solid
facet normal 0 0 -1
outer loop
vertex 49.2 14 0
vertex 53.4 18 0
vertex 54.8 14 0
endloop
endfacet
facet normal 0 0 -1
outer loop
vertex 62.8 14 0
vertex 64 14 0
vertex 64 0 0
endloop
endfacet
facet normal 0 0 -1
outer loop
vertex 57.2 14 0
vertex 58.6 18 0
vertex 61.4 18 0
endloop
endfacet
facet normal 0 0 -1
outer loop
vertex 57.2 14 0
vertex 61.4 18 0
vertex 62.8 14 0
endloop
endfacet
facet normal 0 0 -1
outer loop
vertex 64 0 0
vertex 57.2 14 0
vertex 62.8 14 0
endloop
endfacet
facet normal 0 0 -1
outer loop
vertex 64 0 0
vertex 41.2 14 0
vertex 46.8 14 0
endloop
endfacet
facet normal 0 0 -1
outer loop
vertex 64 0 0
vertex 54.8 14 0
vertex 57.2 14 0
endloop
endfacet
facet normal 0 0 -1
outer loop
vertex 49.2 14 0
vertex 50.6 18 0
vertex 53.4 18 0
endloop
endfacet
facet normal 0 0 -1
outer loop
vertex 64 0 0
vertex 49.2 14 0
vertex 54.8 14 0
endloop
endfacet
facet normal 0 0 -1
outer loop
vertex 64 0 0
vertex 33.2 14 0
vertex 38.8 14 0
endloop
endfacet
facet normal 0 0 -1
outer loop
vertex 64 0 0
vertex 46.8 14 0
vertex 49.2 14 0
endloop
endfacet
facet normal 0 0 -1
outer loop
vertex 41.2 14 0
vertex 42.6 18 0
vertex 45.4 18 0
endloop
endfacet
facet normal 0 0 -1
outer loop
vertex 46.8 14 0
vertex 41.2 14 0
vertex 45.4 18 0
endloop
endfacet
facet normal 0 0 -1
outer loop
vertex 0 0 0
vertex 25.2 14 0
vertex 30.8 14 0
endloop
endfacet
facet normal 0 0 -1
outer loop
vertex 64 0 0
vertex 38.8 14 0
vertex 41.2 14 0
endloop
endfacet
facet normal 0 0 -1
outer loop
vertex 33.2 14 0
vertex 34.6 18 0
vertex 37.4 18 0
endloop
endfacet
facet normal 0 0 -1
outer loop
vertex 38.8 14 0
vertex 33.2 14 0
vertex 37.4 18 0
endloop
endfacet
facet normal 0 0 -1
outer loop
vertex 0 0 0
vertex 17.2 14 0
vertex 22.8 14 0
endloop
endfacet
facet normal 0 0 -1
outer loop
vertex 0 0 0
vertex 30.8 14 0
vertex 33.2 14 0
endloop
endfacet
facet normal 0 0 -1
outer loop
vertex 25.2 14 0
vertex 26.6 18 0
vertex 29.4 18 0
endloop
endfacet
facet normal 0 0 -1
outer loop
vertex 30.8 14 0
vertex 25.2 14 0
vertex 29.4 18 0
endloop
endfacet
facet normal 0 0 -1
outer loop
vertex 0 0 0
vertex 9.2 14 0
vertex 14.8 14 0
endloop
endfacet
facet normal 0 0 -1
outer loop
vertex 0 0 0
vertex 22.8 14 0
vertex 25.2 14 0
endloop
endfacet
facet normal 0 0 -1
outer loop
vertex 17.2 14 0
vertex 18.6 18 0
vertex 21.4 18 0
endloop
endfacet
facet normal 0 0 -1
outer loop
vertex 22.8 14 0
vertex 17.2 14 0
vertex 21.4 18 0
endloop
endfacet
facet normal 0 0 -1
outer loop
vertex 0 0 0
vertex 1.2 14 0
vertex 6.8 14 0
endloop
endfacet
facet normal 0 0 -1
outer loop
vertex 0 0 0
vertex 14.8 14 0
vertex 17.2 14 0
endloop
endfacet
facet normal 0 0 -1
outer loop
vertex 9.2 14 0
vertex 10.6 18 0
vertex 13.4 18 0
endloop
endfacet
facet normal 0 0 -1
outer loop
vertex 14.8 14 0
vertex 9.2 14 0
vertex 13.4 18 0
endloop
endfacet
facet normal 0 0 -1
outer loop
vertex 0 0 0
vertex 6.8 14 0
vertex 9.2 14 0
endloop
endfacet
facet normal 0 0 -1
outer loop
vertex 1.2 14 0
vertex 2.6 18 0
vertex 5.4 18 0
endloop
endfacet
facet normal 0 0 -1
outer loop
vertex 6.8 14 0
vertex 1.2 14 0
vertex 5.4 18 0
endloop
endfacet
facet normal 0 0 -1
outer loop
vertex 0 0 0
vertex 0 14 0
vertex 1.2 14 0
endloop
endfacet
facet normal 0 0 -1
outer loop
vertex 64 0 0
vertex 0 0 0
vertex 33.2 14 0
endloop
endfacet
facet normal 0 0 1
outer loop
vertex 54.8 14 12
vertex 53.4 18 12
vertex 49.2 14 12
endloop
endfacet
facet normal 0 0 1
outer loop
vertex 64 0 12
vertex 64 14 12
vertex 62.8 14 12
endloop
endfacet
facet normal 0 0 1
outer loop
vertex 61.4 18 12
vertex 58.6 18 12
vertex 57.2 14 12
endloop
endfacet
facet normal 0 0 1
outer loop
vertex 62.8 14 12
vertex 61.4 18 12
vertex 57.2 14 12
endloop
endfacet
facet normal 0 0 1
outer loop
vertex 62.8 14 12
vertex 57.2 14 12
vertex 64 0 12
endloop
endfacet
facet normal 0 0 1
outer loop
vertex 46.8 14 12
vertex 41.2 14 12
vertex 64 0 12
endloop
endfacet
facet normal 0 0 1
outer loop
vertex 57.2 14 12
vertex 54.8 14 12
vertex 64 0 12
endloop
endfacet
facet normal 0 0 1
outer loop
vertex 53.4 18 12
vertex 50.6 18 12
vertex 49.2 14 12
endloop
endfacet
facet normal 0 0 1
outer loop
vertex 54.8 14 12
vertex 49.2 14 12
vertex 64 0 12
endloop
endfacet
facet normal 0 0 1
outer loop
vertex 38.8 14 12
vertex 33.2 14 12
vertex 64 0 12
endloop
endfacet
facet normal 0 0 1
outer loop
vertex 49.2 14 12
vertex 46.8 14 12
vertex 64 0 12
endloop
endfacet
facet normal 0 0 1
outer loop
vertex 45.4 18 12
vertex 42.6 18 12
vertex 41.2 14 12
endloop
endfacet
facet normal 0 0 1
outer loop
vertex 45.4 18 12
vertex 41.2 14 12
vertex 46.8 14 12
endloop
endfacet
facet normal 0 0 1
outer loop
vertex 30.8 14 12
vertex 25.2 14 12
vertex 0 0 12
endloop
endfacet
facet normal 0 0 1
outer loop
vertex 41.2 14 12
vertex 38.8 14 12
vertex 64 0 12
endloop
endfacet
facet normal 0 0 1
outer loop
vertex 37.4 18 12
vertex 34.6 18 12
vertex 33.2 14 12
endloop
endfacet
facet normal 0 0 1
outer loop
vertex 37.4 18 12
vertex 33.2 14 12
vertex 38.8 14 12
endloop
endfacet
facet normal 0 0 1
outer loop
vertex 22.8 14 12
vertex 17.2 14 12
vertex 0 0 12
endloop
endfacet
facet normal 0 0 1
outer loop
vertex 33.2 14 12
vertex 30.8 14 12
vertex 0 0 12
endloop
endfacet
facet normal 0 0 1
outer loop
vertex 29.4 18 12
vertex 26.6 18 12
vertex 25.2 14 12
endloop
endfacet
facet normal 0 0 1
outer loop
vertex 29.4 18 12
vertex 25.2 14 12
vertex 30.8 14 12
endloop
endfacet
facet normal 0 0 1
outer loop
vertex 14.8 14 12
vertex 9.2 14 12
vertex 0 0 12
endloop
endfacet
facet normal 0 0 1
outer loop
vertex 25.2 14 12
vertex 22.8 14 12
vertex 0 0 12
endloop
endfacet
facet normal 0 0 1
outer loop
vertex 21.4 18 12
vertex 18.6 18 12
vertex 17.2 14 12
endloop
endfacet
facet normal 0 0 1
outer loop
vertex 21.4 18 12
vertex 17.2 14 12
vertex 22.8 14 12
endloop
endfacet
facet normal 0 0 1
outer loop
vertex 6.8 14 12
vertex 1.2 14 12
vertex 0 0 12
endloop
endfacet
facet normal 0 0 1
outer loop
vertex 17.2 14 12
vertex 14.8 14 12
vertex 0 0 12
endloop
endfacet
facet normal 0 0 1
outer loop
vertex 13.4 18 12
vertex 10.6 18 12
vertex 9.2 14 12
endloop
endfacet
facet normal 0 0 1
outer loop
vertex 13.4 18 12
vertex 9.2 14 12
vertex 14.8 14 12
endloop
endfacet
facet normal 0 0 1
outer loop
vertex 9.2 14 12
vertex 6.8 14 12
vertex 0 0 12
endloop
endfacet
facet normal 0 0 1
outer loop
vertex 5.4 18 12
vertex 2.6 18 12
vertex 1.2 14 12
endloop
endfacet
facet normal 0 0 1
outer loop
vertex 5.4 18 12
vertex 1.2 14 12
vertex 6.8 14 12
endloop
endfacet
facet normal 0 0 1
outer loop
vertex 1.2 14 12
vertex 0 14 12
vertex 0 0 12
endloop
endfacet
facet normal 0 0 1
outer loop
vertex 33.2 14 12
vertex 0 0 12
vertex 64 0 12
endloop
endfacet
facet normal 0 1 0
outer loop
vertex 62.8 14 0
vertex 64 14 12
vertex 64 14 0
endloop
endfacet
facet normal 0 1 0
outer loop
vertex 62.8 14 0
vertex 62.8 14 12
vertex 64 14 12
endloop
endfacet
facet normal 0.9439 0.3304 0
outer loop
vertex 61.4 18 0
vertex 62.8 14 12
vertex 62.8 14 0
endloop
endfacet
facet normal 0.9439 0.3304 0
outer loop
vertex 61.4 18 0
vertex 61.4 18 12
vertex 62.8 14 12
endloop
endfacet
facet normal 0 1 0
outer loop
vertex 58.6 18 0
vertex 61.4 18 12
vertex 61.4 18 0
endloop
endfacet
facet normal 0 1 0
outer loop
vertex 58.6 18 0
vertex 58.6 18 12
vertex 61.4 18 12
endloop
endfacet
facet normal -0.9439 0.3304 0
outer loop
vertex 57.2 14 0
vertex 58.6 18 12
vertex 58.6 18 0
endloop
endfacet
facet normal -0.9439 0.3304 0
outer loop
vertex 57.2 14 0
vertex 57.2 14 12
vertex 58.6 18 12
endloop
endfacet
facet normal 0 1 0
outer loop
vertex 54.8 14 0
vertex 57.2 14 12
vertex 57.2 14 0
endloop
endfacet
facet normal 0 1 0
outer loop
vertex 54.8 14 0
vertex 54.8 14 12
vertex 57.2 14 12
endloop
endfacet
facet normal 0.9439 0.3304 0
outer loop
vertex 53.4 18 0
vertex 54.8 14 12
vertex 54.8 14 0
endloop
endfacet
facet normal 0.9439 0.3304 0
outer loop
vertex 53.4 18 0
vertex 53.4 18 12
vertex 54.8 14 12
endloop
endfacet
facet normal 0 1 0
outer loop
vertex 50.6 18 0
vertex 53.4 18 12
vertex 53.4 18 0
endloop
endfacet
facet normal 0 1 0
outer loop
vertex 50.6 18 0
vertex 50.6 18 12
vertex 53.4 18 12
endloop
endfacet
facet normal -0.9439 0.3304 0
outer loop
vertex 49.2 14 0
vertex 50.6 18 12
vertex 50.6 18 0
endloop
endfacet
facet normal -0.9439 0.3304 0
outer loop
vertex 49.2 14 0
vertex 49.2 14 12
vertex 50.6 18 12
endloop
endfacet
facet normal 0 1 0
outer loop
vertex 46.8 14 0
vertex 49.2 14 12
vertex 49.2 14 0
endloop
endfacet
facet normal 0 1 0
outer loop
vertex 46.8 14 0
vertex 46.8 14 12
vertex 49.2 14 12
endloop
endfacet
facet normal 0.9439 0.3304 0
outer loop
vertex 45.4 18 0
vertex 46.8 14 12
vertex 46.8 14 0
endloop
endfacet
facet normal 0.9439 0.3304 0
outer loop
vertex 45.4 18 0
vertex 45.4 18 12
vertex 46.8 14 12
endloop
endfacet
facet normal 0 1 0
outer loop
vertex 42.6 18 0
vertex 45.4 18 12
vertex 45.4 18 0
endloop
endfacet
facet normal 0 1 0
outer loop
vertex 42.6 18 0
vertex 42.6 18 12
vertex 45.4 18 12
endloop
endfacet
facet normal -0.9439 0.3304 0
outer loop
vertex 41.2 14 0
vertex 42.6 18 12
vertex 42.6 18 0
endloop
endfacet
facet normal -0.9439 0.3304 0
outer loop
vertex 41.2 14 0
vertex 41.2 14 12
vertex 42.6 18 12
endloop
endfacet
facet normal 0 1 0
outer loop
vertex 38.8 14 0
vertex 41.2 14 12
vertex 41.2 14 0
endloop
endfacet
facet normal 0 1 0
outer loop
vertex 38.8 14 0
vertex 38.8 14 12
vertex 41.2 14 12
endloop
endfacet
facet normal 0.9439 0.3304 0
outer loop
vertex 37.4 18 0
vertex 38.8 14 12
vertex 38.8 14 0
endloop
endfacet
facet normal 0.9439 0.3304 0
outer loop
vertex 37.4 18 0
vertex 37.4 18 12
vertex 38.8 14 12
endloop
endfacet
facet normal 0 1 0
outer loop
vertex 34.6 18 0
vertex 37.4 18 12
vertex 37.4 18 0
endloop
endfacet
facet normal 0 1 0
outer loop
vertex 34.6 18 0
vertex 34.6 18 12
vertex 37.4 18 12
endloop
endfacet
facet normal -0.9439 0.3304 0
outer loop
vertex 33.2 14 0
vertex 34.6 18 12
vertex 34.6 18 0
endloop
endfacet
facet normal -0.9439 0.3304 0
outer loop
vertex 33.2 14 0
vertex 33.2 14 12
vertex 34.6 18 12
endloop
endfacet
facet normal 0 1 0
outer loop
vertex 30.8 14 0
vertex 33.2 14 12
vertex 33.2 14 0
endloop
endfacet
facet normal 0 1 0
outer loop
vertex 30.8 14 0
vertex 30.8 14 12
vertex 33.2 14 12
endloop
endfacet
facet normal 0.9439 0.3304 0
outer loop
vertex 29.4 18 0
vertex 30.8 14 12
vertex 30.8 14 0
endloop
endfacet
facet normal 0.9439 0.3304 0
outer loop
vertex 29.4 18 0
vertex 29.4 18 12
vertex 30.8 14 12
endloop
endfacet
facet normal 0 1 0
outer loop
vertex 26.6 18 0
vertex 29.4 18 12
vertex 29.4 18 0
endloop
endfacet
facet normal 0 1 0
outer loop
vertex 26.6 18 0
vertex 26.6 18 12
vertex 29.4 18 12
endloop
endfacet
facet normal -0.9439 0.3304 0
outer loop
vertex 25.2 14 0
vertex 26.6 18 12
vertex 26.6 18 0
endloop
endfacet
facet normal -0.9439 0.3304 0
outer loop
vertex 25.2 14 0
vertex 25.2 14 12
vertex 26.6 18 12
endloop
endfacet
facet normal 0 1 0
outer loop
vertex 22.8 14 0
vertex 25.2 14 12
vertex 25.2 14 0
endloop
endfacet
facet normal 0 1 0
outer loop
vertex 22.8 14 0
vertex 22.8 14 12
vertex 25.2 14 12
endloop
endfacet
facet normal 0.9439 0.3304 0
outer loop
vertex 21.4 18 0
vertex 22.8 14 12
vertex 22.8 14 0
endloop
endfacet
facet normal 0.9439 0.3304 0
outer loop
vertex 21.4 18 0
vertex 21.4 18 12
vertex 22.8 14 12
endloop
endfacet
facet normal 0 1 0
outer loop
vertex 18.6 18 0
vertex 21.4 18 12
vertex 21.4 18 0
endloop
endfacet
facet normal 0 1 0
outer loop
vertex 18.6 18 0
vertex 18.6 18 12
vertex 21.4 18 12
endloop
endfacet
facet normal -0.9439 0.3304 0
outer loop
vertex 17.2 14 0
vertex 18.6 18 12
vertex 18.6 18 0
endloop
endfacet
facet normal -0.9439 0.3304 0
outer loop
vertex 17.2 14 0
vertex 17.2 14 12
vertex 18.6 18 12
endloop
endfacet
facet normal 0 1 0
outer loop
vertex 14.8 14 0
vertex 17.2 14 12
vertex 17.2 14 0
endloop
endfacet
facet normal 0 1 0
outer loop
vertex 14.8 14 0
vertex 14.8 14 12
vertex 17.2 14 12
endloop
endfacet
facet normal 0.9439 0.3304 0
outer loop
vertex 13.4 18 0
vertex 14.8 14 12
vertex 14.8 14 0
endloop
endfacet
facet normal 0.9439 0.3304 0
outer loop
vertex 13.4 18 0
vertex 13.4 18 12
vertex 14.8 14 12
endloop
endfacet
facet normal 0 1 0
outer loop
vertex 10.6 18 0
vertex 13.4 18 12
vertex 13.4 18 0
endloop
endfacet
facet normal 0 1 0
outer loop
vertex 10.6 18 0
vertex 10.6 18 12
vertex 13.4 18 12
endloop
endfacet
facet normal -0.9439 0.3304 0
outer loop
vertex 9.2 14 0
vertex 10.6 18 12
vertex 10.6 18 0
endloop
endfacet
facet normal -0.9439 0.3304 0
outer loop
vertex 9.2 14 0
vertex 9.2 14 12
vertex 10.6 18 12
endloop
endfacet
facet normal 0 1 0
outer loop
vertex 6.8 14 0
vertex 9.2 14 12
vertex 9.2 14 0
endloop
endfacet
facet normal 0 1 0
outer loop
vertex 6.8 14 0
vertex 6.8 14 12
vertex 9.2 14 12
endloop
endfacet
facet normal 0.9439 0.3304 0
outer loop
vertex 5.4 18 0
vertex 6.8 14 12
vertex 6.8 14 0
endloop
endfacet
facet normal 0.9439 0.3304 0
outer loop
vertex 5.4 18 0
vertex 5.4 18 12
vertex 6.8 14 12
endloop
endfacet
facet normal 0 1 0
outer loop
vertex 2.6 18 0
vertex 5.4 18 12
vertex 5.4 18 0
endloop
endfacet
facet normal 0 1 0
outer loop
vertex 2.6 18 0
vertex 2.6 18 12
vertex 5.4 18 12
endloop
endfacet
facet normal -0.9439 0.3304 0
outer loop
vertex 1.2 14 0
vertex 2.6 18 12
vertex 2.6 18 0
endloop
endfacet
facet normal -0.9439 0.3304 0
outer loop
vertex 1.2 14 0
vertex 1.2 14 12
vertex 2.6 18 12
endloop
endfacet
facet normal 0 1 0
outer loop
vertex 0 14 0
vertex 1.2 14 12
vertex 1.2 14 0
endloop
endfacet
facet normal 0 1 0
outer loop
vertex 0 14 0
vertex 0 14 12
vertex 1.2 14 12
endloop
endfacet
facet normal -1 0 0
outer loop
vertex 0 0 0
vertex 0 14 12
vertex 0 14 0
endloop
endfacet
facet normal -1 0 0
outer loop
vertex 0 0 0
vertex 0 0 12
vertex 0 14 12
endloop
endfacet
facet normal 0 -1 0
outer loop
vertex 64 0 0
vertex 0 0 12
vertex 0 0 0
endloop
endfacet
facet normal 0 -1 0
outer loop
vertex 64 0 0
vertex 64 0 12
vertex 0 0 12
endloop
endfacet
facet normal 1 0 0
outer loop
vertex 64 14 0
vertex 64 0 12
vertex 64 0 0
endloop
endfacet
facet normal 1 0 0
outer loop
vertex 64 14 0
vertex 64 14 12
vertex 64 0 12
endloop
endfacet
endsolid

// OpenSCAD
$fn = 32;

// ----------------------------------------------------------------------
// Gear rack: 8 teeth, pitch 8 mm
// ----------------------------------------------------------------------

// --- parameters (mm) ---
teeth = 8;                // number of teeth
pitch = 8;                // tooth pitch, X
root_w = 5.6;             // tooth width at the root
tip_w = 2.8;              // tooth width at the tip
base_h = 14;              // rack body height, Y
tooth_h = 4;              // tooth height above the body
plate_t = 12;             // rack width, Z (extrusion height)

rack_l = teeth * pitch;  // overall length
total_h = base_h + tooth_h;  // overall height

profile = [[0, 0], [64, 0], [64, 14], [62.8, 14], [61.4, 18], [58.6, 18], [57.2, 14], [54.8, 14], [53.4, 18], [50.6, 18], [49.2, 14], [46.8, 14], [45.4, 18], [42.6, 18], [41.2, 14], [38.8, 14], [37.4, 18], [34.6, 18], [33.2, 14], [30.8, 14], [29.4, 18], [26.6, 18], [25.2, 14], [22.8, 14], [21.4, 18], [18.6, 18], [17.2, 14], [14.8, 14], [13.4, 18], [10.6, 18], [9.2, 14], [6.8, 14], [5.4, 18], [2.6, 18], [1.2, 14], [0, 14]];  // primary outline, 36 points, counter clockwise

// --- the one profile operation ---
linear_extrude(height = plate_t) polygon(points = profile);
